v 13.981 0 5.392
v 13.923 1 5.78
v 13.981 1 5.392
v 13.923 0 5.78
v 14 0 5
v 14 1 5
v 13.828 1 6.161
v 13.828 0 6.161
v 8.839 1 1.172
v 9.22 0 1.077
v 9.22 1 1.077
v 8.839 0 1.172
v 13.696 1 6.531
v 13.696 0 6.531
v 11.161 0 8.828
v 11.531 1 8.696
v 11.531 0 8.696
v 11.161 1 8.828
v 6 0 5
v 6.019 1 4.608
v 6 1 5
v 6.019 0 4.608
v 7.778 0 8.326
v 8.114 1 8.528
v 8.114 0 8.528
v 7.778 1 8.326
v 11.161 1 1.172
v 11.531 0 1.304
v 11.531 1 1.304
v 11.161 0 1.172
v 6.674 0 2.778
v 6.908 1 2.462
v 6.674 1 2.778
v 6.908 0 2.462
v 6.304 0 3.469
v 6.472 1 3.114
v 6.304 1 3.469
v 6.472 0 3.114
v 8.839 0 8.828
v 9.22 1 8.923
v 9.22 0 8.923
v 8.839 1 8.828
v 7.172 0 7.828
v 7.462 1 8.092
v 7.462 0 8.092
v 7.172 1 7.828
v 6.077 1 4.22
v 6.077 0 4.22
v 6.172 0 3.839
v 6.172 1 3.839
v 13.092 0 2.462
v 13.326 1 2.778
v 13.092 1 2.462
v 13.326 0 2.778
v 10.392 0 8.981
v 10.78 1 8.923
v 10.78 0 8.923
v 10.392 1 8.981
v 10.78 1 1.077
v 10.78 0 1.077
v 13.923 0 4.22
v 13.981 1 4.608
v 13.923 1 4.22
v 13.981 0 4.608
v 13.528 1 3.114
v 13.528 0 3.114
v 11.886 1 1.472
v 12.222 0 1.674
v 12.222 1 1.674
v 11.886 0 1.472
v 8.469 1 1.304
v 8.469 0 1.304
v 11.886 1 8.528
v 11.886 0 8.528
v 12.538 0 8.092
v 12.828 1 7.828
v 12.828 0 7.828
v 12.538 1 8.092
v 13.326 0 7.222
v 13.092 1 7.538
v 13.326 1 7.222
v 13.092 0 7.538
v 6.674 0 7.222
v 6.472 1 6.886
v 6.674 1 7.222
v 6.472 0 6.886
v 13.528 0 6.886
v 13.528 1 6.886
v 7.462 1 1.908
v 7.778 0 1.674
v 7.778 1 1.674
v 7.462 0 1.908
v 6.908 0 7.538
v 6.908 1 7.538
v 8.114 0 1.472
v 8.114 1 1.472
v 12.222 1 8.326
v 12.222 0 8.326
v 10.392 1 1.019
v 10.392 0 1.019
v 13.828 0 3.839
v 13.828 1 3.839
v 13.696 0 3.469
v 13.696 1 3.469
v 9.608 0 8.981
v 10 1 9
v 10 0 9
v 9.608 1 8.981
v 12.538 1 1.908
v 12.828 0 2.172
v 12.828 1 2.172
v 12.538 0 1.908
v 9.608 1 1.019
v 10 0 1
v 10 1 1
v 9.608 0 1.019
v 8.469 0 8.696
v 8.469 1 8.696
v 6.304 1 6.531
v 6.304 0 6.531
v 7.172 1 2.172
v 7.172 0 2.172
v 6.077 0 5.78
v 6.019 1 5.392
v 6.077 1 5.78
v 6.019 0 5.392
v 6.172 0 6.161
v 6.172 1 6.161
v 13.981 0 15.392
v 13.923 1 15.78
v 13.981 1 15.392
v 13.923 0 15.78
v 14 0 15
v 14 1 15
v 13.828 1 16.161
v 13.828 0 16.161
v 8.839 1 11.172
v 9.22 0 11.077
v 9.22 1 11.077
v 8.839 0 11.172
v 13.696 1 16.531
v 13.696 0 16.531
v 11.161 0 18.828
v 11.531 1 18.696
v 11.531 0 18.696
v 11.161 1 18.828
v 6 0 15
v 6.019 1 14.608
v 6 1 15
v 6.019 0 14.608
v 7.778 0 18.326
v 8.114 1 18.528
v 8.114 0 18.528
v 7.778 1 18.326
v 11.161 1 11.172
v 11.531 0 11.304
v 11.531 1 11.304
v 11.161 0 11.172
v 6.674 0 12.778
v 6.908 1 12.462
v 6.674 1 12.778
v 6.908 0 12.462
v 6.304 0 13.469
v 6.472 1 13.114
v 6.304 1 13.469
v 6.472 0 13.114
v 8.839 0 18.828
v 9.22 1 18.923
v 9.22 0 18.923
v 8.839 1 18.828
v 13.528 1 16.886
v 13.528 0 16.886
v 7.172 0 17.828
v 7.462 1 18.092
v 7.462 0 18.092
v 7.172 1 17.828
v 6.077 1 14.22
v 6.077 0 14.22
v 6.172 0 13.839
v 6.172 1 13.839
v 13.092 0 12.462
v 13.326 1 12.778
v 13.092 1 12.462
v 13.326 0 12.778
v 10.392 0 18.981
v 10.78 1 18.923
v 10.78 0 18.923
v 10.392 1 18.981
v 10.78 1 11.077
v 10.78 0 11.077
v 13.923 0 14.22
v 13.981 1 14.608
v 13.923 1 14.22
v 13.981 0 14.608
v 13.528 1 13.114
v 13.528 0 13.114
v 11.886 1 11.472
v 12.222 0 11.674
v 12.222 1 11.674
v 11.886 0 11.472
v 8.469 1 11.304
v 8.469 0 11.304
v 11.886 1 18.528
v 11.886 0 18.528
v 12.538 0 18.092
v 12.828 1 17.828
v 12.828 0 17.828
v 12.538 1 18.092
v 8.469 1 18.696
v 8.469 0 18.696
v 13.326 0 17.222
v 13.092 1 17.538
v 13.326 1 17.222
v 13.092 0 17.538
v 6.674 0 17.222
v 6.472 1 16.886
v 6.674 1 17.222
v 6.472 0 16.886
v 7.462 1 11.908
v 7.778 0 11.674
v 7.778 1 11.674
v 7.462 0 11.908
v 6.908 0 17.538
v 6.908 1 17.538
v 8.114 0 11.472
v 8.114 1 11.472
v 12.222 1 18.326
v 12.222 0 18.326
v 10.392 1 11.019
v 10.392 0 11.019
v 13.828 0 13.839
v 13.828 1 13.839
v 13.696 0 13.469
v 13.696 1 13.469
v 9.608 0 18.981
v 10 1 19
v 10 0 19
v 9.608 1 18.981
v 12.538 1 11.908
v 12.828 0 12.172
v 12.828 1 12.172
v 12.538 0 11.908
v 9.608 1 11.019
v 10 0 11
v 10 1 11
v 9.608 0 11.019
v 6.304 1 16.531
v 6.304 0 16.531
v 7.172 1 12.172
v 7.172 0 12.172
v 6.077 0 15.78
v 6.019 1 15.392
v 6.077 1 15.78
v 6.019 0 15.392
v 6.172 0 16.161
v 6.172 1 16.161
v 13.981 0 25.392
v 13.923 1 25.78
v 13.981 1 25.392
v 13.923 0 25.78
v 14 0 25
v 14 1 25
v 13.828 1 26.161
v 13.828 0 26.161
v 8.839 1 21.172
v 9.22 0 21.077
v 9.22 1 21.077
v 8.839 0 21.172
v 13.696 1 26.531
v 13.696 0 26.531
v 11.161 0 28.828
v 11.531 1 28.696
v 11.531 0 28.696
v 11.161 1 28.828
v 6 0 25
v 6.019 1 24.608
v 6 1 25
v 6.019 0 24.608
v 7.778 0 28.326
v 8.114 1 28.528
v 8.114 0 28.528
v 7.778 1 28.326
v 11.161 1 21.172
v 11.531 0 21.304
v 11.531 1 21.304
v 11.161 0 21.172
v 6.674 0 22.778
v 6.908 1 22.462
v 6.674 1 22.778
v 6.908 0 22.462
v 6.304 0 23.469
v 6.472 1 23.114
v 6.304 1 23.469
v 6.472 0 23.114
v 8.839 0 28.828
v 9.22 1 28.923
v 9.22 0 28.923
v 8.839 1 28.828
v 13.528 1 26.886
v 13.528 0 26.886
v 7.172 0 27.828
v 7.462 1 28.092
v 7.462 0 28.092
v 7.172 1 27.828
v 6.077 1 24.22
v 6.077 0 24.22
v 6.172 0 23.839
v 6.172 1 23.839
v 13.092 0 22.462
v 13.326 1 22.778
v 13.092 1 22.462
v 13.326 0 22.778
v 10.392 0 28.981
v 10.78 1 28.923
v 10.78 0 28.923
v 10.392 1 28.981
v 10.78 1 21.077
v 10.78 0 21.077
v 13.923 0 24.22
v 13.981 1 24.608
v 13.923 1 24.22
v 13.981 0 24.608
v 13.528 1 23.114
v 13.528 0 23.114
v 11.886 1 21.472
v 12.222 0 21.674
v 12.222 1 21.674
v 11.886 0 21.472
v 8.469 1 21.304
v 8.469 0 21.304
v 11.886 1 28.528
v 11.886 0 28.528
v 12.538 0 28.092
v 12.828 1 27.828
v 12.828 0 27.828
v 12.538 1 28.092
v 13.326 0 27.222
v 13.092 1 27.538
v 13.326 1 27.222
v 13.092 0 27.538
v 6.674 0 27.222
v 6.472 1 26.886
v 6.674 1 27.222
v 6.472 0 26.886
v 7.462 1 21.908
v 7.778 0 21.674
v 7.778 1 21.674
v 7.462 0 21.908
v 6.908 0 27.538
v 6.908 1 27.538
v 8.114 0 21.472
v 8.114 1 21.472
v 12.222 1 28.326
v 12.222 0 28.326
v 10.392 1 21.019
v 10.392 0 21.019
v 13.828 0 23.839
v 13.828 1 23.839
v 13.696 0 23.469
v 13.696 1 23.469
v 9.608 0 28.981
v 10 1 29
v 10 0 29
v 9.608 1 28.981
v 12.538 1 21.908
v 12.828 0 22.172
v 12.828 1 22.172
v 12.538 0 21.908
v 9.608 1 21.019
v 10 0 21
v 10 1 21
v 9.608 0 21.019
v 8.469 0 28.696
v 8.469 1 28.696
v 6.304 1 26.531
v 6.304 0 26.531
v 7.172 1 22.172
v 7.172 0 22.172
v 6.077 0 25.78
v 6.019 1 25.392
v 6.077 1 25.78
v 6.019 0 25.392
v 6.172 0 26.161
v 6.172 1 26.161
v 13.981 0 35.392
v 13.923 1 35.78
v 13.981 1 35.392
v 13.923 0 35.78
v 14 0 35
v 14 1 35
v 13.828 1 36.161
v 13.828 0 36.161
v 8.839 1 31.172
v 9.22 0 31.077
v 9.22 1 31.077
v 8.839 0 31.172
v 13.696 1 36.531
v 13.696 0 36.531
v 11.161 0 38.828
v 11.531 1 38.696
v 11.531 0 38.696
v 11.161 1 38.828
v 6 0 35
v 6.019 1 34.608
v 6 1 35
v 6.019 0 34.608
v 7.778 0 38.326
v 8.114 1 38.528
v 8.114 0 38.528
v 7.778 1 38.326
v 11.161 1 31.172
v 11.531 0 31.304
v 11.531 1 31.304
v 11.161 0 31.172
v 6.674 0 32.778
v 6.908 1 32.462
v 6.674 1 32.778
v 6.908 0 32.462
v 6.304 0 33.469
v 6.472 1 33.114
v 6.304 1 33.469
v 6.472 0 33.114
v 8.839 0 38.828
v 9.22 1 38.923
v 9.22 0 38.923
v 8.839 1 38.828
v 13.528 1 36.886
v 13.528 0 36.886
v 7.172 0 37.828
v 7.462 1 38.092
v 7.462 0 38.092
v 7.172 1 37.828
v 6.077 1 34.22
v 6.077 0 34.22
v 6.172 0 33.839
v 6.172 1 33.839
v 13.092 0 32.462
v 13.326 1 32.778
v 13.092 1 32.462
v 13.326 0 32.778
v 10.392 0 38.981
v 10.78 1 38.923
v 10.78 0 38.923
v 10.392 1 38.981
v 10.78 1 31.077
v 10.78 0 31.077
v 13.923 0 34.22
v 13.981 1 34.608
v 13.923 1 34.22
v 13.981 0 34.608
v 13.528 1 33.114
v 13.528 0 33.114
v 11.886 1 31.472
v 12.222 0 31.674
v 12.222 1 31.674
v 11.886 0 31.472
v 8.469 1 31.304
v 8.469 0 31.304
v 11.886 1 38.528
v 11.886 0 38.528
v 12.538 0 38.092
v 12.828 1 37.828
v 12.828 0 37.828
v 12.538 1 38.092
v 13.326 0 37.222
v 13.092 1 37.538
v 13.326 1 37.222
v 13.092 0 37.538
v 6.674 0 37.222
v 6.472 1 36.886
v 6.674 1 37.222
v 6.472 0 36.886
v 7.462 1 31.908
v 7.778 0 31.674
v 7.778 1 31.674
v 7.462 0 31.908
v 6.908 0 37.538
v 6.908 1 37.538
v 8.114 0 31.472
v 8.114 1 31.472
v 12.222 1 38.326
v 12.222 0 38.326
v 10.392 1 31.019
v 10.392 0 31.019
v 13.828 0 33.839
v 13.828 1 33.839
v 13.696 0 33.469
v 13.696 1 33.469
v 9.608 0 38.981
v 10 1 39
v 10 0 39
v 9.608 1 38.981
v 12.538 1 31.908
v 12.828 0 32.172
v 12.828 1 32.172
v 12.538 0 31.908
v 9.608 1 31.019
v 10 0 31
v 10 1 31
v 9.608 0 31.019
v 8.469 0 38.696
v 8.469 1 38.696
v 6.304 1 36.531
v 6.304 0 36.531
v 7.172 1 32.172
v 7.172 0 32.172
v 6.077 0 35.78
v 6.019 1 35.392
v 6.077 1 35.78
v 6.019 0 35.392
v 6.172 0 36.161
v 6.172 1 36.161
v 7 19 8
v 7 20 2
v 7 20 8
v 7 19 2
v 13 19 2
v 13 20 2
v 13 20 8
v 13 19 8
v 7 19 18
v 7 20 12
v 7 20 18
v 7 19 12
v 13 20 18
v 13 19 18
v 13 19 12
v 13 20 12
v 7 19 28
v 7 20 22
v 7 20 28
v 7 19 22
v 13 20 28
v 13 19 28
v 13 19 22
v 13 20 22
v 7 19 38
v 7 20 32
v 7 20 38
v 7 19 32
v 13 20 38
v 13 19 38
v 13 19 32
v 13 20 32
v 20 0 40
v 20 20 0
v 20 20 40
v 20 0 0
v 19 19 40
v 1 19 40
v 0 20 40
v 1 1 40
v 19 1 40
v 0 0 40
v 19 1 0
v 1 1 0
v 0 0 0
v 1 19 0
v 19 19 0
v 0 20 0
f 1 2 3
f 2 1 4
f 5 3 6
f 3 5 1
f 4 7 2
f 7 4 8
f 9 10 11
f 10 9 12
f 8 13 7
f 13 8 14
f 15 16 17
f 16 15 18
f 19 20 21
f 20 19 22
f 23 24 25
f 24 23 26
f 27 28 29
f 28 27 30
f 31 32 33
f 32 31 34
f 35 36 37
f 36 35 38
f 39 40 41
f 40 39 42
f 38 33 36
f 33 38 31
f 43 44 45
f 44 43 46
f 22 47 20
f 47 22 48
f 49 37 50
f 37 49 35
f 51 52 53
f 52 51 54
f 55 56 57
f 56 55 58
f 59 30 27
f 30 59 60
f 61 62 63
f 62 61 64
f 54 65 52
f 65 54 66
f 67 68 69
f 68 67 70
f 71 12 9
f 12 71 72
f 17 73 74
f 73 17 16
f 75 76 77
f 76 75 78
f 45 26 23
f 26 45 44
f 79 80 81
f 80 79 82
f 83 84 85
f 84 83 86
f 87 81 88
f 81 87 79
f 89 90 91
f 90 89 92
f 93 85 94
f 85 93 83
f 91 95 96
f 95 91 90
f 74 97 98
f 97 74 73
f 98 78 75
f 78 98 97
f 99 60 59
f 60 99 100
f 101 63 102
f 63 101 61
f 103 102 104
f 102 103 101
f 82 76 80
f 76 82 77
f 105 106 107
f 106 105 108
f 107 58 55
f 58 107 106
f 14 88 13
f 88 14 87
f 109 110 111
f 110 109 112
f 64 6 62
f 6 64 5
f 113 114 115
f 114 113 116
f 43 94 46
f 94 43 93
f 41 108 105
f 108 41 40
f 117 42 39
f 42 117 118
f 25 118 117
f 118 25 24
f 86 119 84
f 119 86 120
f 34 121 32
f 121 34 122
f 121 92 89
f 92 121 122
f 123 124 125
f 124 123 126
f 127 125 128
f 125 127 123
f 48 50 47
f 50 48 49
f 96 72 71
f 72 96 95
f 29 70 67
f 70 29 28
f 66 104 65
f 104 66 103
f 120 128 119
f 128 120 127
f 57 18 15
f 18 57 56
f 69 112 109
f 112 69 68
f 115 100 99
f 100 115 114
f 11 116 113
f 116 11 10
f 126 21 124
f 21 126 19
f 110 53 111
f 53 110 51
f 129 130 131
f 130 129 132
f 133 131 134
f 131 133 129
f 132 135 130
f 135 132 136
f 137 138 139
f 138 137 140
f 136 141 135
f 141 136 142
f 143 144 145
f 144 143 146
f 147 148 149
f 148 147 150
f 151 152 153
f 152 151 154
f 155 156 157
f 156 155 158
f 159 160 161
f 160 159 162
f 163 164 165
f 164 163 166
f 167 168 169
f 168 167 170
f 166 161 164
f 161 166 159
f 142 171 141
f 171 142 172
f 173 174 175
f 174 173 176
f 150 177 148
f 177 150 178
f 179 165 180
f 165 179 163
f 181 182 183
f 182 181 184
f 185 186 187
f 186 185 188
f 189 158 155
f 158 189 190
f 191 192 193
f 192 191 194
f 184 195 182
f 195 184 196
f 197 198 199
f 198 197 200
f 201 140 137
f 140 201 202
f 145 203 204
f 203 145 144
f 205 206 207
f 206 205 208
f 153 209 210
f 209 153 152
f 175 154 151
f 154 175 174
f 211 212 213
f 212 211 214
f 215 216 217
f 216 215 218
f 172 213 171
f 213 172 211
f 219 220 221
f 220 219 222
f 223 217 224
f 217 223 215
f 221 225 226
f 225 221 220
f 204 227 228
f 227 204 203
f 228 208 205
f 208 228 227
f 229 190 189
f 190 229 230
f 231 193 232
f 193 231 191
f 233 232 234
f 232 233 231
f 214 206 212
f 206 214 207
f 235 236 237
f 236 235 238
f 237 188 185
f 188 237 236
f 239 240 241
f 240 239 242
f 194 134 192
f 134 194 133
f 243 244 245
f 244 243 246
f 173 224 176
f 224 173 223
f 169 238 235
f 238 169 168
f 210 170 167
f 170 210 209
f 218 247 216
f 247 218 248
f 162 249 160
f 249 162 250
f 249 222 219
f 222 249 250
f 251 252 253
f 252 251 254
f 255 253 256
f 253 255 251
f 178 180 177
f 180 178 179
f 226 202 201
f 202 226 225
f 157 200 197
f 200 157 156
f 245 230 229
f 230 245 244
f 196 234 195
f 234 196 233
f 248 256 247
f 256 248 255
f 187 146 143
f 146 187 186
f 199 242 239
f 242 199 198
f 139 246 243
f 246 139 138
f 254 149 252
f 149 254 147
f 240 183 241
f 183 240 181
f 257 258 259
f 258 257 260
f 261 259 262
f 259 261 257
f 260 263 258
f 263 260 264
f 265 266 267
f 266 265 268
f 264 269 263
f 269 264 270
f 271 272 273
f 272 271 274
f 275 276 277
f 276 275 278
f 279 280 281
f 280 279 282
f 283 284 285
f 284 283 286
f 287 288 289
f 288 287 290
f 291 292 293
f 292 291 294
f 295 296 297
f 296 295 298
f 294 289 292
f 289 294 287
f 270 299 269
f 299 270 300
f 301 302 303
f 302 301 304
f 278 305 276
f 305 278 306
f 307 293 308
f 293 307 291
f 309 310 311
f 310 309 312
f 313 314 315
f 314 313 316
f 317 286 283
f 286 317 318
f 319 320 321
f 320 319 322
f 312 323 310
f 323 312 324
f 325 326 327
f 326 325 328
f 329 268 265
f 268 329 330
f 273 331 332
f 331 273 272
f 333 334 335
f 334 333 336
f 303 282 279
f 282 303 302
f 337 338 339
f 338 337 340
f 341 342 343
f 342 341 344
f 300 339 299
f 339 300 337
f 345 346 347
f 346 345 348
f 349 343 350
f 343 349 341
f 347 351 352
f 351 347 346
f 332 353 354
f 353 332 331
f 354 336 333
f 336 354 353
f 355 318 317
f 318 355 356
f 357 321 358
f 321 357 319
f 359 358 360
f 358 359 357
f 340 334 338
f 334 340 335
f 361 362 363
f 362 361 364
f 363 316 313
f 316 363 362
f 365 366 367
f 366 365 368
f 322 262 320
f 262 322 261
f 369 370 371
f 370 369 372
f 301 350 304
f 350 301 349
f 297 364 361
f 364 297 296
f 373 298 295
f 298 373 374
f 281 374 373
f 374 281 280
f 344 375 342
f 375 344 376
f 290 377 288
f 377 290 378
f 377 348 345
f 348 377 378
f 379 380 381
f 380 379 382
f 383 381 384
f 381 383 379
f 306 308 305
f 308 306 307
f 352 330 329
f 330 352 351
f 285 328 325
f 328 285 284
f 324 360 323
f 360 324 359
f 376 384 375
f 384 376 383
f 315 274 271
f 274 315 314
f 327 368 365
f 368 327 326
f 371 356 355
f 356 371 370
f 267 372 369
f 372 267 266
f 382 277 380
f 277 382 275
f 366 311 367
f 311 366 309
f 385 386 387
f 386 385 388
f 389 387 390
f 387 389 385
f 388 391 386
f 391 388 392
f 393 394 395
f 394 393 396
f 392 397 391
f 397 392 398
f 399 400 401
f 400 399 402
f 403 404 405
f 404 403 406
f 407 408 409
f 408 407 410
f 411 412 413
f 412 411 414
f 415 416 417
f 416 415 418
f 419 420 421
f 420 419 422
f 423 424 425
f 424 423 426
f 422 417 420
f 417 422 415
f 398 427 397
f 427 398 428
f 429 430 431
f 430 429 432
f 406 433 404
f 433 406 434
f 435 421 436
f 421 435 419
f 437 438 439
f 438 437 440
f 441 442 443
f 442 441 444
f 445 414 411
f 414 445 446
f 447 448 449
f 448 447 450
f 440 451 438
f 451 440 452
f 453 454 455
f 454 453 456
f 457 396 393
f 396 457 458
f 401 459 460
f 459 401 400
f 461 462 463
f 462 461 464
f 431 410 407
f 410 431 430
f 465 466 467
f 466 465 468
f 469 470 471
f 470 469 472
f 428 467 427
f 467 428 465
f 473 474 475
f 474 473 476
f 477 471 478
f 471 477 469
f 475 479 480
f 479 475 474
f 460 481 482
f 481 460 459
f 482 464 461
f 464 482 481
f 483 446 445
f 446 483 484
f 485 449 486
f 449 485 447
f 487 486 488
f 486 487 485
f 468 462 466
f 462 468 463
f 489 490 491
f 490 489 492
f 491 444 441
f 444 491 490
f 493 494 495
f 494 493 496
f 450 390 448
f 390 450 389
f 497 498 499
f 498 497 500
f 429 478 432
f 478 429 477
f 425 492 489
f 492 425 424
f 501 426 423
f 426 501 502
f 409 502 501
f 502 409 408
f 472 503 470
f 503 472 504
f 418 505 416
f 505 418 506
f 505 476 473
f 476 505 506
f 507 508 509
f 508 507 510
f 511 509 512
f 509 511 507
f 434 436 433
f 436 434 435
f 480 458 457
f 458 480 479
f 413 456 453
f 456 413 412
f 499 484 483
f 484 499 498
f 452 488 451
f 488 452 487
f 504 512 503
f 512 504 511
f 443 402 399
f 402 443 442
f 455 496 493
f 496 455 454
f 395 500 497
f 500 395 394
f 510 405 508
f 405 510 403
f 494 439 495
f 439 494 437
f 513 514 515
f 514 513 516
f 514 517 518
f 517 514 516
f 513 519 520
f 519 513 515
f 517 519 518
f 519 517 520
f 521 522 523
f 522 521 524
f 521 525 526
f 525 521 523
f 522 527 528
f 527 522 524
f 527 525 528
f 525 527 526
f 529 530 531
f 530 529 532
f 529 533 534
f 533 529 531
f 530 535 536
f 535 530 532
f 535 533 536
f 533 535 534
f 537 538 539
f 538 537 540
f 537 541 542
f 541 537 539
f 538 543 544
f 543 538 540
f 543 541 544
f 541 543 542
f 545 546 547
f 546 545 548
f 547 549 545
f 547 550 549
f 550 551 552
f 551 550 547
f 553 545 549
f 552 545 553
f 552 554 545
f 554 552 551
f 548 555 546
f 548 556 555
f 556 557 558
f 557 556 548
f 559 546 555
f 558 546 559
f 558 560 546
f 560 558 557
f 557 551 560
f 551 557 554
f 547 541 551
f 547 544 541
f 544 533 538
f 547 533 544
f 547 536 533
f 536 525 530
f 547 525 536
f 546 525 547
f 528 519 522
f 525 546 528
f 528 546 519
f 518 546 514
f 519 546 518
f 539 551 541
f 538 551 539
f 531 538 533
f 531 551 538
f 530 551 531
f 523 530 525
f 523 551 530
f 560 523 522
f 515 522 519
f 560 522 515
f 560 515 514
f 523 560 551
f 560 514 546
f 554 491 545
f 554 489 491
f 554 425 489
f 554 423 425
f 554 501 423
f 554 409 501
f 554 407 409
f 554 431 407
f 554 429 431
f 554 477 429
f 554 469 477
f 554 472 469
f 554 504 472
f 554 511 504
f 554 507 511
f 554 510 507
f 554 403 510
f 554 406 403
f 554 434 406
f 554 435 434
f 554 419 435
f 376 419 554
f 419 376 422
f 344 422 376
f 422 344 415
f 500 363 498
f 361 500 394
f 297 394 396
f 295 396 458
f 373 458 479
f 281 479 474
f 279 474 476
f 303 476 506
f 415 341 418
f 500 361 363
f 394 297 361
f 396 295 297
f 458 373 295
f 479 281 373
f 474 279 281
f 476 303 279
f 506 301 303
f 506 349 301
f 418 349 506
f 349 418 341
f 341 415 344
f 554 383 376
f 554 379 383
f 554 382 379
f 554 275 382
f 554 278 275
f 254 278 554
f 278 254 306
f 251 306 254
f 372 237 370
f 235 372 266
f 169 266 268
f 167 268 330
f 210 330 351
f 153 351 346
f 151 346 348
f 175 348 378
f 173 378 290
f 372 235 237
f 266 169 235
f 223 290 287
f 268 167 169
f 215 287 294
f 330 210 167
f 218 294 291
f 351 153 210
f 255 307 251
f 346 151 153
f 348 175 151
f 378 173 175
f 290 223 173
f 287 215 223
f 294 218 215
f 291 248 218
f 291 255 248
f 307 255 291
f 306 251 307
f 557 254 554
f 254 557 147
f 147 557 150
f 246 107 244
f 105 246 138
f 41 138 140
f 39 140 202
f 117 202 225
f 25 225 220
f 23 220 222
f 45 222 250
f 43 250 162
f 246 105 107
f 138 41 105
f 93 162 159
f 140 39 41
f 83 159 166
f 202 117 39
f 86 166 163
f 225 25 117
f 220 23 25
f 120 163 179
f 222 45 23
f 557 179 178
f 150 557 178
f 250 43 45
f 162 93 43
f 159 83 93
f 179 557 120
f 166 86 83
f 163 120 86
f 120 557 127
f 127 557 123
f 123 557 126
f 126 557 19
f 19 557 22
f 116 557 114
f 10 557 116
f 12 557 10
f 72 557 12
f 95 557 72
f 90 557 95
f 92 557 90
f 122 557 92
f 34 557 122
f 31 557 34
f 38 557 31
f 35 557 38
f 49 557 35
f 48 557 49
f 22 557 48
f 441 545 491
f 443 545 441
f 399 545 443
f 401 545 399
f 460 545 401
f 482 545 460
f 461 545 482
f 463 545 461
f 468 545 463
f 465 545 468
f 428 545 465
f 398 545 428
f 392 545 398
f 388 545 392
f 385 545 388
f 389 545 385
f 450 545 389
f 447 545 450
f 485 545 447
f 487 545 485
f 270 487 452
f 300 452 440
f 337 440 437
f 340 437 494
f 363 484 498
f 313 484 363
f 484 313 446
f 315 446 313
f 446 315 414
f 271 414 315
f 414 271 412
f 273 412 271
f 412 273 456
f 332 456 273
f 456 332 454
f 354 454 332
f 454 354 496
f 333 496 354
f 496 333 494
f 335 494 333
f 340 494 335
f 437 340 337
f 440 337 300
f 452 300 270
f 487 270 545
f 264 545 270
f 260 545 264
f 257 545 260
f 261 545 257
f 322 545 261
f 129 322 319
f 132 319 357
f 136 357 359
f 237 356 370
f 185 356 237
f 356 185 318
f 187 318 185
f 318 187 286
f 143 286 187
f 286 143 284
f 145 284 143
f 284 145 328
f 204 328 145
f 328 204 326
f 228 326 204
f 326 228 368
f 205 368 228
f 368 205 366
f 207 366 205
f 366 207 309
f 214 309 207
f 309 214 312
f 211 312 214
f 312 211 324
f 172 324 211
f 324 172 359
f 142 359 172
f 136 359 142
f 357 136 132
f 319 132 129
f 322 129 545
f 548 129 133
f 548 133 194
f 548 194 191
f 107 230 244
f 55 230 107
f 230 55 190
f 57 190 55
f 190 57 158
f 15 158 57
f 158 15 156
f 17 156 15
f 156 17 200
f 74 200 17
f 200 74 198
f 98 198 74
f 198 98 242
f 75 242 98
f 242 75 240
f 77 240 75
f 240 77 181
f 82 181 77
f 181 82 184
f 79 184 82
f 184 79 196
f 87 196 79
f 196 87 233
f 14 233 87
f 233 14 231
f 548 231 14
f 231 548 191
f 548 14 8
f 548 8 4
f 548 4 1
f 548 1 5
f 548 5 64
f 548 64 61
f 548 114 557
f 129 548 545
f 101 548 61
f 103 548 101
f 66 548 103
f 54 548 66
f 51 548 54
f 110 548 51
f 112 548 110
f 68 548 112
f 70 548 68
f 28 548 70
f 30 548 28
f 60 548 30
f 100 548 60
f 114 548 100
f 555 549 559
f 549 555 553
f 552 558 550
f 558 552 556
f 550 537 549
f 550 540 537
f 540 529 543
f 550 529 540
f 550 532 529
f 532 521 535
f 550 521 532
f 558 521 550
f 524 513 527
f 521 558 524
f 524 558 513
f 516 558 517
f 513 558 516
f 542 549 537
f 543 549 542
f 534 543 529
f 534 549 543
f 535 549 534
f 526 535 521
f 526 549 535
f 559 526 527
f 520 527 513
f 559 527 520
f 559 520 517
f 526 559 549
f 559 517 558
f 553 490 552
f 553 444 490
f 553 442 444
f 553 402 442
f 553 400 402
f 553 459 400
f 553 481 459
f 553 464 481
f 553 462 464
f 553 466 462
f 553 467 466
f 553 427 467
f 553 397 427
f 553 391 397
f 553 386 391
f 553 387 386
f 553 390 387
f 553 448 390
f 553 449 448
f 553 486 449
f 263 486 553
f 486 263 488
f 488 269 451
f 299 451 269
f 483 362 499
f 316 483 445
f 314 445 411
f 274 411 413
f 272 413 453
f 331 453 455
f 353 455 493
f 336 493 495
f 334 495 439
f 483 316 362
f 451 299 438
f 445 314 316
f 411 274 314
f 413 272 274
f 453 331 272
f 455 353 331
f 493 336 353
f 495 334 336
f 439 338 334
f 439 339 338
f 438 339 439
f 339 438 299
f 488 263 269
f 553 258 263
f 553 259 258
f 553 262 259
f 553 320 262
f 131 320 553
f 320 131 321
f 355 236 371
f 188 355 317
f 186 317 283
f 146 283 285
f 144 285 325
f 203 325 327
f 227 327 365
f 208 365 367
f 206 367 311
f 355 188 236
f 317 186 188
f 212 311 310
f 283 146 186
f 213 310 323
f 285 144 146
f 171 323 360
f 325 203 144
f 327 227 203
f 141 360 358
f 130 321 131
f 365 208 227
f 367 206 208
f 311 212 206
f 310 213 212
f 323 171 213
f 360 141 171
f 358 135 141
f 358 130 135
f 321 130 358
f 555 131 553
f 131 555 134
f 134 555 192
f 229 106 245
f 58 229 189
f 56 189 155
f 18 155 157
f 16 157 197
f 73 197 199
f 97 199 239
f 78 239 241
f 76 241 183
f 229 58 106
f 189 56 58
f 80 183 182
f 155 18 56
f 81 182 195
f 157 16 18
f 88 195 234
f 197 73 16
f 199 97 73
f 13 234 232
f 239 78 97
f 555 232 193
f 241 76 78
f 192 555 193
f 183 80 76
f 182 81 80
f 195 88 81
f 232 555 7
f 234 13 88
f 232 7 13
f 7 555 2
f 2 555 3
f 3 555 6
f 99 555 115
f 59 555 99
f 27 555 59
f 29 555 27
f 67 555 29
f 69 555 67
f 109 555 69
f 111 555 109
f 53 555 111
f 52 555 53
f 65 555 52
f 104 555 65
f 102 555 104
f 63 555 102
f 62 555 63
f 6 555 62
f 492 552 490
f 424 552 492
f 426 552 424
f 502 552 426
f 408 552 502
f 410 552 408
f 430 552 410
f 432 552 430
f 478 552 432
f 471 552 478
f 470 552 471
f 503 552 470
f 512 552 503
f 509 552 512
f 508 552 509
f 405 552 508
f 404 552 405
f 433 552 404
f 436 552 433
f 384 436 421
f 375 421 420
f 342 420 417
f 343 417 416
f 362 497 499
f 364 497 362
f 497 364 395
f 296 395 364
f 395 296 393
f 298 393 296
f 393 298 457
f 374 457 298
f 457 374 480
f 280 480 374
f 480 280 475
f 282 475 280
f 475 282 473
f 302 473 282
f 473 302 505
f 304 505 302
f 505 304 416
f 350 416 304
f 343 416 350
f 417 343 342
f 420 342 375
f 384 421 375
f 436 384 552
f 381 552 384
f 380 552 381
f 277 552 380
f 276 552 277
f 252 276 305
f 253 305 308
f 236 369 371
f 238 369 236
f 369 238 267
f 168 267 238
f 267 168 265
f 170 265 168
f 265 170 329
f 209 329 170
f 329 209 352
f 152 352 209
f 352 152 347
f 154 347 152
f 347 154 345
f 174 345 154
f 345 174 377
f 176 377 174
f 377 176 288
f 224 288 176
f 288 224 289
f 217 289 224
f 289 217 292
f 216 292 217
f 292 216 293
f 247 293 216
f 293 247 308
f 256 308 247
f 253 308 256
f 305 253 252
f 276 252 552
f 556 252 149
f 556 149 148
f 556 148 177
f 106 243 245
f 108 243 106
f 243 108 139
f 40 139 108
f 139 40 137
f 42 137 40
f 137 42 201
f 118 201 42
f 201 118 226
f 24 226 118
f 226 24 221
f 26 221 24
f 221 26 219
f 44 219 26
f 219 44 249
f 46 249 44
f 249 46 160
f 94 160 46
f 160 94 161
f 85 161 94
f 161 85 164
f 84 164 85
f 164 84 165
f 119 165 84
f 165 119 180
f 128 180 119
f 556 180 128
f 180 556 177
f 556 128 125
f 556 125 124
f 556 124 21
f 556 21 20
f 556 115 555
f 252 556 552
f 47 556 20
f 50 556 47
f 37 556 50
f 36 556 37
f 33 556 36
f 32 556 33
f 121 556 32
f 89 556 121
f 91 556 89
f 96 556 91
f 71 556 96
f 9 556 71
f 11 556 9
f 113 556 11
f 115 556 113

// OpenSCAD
$fn=64;
h=40;

difference(){
    cube([20,20,h]);
    
    translate([1,1,-1])
    cube([18,18,h+2]);
    
    // Circles
    for(i=[0:3]){
        translate([10,2,5+(h/4*i)])
        rotate([90,0,0])
        cylinder(d=8,h=20);
    }

    // Squares
    for(i=[0:3]){
        translate([7,22,2+(h/4*i)])
        rotate([90,0,0])
        cube([6,6,6]);
    }
}    
